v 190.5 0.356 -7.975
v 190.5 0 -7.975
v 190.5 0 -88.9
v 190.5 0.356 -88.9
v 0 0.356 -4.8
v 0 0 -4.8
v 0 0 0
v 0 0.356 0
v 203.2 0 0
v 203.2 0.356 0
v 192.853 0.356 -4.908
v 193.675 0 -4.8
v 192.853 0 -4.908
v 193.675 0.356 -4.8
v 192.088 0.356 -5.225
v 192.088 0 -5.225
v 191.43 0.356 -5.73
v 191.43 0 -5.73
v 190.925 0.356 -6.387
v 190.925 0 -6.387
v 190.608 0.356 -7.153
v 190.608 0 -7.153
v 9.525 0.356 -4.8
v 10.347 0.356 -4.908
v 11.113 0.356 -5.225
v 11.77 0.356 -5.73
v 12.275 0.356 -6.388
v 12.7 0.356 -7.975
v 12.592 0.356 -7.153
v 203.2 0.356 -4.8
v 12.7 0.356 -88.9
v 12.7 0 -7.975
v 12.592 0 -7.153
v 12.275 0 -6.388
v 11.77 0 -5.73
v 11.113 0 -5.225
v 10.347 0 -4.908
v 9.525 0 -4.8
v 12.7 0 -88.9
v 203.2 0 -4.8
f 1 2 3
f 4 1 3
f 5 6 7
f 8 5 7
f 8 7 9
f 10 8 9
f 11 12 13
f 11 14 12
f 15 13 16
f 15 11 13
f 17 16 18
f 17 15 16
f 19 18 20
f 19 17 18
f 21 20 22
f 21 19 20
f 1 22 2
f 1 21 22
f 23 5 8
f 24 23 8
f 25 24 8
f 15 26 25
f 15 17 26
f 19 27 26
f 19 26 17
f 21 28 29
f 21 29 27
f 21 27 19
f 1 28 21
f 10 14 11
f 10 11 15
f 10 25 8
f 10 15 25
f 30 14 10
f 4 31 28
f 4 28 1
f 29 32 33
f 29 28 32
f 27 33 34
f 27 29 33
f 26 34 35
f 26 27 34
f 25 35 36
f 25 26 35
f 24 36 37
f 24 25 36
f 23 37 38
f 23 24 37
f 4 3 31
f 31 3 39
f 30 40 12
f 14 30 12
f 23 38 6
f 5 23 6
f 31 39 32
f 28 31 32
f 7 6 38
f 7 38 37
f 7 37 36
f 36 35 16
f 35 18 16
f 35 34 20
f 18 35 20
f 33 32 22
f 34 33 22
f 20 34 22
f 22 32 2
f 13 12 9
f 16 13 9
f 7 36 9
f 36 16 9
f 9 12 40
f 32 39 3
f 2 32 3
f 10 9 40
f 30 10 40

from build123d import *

# Parameters (mm, degrees)
BOSS_EXTRUDE1_DEPTH = 0.3556
FILLET3_R           = 3.175


with BuildPart() as part:
    # Sketch1 → Boss-Extrude1 (new body)
    with BuildSketch(Plane(origin=(0, 0, 0), x_dir=(1, 0, 0), z_dir=(0, 1, 0))):
        Polygon((12.7, 88.9), (12.7, 4.8), (0, 4.8), (0, 0), (12.7, 0), (190.5, 0), (203.2, 0), (203.2, 4.8), (190.5, 4.8), (190.5, 88.9), align=None)
    extrude(amount=BOSS_EXTRUDE1_DEPTH)

    # Fillet3
    fillet3_edges = [part.edges().sort_by_distance(p)[0] for p in [
        (12.7, 0.1778, -4.8),
        (190.5, 0.1778, -4.8),
    ]]
    fillet(fillet3_edges, radius=FILLET3_R)


solid = part.part
